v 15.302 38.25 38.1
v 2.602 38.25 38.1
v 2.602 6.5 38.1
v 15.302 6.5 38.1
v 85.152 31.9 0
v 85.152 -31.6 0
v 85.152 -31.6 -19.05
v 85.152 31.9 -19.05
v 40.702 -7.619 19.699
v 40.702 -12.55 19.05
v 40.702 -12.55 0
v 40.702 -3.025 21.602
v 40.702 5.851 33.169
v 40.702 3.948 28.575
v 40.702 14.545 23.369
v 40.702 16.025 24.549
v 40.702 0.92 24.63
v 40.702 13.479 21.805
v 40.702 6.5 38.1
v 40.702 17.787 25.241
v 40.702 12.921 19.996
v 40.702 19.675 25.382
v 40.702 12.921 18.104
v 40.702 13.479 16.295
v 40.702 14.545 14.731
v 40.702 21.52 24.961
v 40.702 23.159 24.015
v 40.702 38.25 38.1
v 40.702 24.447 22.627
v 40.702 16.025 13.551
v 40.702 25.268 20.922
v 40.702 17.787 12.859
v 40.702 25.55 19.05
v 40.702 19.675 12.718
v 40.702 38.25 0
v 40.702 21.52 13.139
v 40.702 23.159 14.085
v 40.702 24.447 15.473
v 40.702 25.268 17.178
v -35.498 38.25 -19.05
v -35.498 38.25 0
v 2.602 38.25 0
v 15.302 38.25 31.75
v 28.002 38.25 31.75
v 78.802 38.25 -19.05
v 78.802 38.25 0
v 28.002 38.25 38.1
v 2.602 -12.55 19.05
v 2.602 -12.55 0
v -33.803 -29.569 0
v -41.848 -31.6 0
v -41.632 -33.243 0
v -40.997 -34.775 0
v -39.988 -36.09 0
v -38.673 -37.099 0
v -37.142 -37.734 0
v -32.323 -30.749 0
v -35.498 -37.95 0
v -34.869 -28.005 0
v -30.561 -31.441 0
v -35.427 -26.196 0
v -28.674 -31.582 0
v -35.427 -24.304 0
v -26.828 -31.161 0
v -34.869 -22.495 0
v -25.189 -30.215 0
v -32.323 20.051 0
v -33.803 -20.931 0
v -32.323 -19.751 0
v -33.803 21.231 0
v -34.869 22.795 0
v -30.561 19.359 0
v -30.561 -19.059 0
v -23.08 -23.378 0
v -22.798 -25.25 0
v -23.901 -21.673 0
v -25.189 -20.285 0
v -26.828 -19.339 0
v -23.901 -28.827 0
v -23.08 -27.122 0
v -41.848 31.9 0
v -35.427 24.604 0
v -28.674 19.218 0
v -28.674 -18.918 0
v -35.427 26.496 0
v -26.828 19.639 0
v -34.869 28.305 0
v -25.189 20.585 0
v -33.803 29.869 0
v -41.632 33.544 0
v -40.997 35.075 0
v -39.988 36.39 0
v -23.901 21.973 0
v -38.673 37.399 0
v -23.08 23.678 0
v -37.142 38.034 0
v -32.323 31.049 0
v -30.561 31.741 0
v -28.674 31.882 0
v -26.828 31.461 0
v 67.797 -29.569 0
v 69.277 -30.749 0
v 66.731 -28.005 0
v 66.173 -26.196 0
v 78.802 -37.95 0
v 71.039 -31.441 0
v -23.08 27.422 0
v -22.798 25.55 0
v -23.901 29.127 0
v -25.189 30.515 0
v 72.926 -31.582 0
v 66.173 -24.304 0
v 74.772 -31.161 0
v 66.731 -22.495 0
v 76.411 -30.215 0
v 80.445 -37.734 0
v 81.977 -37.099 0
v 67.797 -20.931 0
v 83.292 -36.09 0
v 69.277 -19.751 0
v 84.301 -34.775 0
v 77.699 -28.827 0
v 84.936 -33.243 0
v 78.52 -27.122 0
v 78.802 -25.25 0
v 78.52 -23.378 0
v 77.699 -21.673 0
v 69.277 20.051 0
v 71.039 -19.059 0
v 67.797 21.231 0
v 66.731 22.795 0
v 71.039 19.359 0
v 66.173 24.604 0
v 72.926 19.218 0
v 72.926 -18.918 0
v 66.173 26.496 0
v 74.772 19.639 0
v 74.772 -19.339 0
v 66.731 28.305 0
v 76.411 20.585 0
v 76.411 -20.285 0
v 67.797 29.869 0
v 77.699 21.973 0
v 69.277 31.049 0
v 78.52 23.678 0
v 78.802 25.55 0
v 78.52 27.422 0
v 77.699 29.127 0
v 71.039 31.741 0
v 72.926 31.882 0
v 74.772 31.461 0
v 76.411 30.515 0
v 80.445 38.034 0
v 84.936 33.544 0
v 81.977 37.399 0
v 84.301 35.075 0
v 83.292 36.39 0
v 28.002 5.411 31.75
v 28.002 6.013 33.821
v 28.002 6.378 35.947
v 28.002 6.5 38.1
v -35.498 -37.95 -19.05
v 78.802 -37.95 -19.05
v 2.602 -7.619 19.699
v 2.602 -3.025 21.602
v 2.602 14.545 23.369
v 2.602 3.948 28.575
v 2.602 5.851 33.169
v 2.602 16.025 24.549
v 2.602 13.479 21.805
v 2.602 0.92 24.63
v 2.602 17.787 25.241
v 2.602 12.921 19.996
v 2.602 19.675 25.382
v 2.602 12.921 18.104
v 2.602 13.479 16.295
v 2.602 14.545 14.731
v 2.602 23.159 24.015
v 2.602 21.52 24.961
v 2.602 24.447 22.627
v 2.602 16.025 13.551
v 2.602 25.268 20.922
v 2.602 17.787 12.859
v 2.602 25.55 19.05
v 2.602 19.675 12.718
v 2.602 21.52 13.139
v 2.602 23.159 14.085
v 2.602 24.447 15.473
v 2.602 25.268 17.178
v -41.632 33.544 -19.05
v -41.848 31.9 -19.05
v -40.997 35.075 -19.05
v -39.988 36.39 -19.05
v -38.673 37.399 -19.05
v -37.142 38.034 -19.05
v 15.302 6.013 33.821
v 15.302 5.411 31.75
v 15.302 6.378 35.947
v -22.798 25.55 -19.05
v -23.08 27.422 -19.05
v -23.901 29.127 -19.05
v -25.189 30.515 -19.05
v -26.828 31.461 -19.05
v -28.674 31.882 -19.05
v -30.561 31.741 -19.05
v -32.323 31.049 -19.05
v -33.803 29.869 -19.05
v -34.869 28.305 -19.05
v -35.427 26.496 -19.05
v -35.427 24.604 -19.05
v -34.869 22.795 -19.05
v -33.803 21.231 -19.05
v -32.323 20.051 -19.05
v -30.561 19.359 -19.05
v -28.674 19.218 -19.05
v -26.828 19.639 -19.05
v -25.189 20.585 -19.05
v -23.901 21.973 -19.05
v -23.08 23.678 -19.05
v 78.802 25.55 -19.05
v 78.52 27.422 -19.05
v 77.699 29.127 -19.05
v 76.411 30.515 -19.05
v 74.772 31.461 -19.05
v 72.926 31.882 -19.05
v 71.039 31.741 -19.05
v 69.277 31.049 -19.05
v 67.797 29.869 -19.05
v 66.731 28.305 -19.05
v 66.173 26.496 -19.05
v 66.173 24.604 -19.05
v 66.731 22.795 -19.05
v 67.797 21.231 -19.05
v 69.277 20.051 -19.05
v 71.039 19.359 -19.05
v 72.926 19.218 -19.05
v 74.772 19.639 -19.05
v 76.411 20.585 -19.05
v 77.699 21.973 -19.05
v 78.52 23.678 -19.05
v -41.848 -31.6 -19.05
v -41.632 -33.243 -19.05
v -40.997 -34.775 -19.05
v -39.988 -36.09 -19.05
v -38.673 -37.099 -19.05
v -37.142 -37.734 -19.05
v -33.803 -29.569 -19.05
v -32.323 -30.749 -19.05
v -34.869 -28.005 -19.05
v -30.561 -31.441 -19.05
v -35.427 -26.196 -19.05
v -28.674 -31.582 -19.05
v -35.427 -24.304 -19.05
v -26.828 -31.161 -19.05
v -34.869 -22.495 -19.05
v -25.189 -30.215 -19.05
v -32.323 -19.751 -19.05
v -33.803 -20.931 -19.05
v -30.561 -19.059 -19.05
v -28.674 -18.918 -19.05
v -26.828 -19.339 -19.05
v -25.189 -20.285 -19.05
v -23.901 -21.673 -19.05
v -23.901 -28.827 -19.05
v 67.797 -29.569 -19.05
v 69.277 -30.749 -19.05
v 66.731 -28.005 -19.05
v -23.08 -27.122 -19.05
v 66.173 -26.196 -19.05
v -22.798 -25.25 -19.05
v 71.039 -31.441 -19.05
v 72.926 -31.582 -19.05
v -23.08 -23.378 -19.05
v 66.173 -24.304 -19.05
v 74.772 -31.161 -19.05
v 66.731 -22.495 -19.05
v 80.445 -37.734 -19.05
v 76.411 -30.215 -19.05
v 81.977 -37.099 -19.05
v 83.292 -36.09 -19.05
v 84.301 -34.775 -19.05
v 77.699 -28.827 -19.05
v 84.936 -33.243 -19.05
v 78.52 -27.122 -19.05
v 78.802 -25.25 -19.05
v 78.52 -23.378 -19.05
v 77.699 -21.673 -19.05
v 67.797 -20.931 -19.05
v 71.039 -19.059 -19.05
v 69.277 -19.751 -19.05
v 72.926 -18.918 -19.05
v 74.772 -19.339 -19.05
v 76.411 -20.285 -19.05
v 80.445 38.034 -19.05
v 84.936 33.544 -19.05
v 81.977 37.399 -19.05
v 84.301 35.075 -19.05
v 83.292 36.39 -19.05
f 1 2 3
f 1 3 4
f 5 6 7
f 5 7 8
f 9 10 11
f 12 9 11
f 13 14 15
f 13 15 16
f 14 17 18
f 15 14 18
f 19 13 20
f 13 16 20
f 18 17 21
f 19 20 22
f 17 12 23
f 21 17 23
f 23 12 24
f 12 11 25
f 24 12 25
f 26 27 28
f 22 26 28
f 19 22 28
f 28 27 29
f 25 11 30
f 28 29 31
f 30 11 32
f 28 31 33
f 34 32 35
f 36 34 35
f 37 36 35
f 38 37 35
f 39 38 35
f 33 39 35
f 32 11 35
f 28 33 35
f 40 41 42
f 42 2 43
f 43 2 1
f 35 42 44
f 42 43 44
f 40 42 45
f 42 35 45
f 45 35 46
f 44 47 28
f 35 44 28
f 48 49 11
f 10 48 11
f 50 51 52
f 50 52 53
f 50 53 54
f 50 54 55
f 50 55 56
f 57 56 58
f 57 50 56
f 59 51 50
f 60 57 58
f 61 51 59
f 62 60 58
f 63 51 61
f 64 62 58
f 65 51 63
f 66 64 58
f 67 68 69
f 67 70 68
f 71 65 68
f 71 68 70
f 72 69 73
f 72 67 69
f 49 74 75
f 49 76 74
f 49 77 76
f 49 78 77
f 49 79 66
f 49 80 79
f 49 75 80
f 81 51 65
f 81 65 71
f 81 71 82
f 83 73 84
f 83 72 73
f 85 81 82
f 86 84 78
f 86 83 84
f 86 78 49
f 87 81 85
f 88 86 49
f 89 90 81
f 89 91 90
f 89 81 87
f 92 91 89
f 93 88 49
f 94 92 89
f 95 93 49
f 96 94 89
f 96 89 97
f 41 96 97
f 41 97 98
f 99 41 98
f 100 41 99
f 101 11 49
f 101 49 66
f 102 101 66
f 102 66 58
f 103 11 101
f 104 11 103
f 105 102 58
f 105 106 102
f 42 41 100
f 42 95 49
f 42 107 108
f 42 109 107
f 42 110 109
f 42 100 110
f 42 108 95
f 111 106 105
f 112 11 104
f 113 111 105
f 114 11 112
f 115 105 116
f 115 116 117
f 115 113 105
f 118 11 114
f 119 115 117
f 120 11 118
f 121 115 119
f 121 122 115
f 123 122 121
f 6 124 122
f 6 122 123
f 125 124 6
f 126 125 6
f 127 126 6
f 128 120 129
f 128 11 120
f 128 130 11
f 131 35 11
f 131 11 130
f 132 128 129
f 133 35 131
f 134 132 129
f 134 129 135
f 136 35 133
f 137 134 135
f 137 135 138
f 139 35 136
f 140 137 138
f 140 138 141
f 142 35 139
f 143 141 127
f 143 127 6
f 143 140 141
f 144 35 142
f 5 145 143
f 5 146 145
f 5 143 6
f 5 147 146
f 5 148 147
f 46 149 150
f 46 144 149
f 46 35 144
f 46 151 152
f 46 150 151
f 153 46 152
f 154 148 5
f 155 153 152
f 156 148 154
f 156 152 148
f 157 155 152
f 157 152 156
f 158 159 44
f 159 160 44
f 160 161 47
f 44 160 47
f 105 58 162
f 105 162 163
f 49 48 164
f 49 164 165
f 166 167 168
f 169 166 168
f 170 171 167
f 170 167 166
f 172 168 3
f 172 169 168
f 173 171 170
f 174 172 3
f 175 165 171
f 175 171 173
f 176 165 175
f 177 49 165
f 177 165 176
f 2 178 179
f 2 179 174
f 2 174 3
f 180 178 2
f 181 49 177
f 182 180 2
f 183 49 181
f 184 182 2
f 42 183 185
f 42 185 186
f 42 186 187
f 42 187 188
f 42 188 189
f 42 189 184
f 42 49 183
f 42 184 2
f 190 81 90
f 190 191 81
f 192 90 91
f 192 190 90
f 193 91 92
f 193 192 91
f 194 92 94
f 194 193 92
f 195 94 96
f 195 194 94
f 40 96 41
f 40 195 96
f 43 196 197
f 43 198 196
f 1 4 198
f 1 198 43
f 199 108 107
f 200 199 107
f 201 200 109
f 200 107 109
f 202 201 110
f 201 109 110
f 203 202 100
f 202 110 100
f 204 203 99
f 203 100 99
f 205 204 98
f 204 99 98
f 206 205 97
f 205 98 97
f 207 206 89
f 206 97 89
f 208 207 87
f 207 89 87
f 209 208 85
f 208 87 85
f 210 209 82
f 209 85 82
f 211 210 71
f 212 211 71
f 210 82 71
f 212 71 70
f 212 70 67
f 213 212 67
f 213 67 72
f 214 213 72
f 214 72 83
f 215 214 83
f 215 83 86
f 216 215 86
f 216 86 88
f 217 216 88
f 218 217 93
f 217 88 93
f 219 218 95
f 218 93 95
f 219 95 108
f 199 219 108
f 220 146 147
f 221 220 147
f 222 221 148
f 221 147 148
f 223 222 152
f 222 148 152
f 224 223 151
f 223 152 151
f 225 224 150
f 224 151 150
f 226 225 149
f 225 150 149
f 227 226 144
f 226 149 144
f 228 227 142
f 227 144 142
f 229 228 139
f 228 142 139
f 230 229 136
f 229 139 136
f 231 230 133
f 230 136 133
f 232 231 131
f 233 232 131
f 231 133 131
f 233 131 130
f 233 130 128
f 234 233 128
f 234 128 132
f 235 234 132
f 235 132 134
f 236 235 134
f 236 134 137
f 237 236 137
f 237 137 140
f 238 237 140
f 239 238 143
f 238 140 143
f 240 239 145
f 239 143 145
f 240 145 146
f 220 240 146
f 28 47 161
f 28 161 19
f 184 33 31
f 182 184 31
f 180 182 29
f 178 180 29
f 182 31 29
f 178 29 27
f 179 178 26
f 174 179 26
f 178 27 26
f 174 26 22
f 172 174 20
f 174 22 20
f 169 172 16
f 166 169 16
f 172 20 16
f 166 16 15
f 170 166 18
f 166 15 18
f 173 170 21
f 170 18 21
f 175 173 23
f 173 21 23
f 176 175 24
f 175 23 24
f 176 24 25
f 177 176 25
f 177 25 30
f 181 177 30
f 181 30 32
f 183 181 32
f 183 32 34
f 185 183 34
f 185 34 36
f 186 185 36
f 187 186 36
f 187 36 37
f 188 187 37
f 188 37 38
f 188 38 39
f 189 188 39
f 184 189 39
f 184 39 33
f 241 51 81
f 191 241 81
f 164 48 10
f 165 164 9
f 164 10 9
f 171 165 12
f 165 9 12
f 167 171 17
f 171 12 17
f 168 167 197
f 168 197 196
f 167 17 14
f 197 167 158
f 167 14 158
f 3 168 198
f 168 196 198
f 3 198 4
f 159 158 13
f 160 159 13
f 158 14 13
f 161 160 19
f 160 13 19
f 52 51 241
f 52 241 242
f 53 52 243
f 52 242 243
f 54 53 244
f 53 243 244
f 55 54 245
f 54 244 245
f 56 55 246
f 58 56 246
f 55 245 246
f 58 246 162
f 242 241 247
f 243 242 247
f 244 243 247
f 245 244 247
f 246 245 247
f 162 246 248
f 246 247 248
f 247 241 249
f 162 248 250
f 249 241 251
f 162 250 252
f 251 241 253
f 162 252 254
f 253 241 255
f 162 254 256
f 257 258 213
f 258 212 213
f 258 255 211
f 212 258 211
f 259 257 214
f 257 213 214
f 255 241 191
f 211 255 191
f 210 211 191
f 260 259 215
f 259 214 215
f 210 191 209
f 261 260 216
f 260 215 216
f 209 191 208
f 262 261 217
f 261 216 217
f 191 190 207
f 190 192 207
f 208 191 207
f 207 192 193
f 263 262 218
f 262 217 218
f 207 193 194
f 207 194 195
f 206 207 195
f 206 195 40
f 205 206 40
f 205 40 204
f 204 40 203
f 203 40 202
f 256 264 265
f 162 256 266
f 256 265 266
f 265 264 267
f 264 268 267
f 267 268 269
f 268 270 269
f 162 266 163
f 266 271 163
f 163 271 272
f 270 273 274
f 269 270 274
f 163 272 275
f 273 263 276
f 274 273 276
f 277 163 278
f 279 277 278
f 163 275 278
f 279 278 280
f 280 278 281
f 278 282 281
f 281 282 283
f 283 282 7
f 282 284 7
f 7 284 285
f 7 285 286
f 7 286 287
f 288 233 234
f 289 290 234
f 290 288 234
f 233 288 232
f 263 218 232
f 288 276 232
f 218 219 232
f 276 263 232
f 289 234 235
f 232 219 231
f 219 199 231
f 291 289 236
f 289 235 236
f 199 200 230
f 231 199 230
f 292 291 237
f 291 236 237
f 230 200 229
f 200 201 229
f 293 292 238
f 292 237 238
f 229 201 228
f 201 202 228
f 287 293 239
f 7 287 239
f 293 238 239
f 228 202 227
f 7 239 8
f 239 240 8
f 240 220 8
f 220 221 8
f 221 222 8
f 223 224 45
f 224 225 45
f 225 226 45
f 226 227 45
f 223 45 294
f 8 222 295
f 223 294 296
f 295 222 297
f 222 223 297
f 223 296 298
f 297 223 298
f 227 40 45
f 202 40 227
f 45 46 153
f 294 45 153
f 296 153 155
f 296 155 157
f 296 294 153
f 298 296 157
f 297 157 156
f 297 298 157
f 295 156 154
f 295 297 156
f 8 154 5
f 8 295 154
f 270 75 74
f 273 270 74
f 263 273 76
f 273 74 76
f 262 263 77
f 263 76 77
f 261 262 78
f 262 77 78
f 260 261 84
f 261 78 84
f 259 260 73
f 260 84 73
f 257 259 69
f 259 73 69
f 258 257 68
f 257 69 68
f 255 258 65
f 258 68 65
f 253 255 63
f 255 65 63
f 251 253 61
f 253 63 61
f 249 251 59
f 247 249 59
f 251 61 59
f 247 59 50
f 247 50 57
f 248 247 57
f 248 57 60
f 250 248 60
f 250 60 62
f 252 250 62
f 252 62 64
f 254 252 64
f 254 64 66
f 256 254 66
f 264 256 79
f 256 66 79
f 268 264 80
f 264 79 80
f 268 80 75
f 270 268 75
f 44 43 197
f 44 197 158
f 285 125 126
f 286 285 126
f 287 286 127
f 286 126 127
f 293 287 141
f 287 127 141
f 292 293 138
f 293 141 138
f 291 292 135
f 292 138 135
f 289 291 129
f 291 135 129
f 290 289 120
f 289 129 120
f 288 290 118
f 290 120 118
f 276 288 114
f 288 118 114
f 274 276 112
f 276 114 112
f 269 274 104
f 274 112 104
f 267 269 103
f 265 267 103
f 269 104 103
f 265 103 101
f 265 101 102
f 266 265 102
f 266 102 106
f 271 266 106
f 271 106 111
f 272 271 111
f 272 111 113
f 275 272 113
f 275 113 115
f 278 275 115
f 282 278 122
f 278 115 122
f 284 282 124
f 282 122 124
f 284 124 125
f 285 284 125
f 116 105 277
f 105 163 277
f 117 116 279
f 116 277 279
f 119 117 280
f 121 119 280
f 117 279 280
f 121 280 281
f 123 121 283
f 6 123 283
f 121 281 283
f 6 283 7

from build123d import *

# Parameters (mm, degrees)
F0_W     = 127
F0_H     = 76.2
F0_R     = 6.35
F1_DEPTH = 19.05
F2_W     = 38.1
F2_H     = 50.8
F3_DEPTH = 38.1
F4_R     = 19.05
F5_DEPTH = 82.551
F6_W     = 12.7
F6_H     = 38.2500794058
F7_DEPTH = 6.35
F8_R     = 6.35
F9_DEPTH = 82.551
F10_R    = 6.35


with BuildPart() as f1:
    # F0 (on Top) → F1 (new body)
    with BuildSketch(Plane.XY):
        with Locations((21.6519124806, 0.1500794058)):
            Rectangle(F0_W, F0_H)
        with Locations((-29.1480875194, -25.2499205942)):
            Circle(F0_R, mode=Mode.SUBTRACT)
        with Locations((72.4519124806, -25.2499205942)):
            Circle(F0_R, mode=Mode.SUBTRACT)
        with Locations((-29.1480875194, 25.5500794058)):
            Circle(F0_R, mode=Mode.SUBTRACT)
        with Locations((72.4519124806, 25.5500794058)):
            Circle(F0_R, mode=Mode.SUBTRACT)
    extrude(amount=-F1_DEPTH)

    # F2 (on face) → F3 (join)
    with BuildSketch(Plane.XY):
        with Locations((21.6519124806, 12.8500794058)):
            Rectangle(F2_W, F2_H)
    extrude(amount=F3_DEPTH)

    # F4 (on face) → F5 (cut, through all)
    with BuildSketch(Plane.YZ.offset(40.7019124806)):
        with Locations((-12.5499205942, 38.1)):
            Circle(F4_R)
    extrude(amount=-F5_DEPTH, mode=Mode.SUBTRACT)

    # F6 (on face) → F7 (cut)
    with BuildSketch(Plane.XY.offset(38.1)):
        with Locations((21.6519124806, 19.1250397029)):
            Rectangle(F6_W, F6_H)
    extrude(amount=-F7_DEPTH, mode=Mode.SUBTRACT)

    # F8 (on face) → F9 (cut, through all)
    with BuildSketch(Plane.YZ.offset(40.7019124806)):
        with Locations((19.2000794058, 19.05)):
            Circle(F8_R)
    extrude(amount=-F9_DEPTH, mode=Mode.SUBTRACT)

    # F10
    f10_edges = [f1.edges().sort_by_distance(p)[0] for p in [
        (-41.848088, -37.949921, -9.525),
        (-41.848088, 38.250079, -9.525),
        (85.151912, -37.949921, -9.525),
        (85.151912, 38.250079, -9.525),
    ]]
    fillet(f10_edges, radius=F10_R)


solid = f1.part
